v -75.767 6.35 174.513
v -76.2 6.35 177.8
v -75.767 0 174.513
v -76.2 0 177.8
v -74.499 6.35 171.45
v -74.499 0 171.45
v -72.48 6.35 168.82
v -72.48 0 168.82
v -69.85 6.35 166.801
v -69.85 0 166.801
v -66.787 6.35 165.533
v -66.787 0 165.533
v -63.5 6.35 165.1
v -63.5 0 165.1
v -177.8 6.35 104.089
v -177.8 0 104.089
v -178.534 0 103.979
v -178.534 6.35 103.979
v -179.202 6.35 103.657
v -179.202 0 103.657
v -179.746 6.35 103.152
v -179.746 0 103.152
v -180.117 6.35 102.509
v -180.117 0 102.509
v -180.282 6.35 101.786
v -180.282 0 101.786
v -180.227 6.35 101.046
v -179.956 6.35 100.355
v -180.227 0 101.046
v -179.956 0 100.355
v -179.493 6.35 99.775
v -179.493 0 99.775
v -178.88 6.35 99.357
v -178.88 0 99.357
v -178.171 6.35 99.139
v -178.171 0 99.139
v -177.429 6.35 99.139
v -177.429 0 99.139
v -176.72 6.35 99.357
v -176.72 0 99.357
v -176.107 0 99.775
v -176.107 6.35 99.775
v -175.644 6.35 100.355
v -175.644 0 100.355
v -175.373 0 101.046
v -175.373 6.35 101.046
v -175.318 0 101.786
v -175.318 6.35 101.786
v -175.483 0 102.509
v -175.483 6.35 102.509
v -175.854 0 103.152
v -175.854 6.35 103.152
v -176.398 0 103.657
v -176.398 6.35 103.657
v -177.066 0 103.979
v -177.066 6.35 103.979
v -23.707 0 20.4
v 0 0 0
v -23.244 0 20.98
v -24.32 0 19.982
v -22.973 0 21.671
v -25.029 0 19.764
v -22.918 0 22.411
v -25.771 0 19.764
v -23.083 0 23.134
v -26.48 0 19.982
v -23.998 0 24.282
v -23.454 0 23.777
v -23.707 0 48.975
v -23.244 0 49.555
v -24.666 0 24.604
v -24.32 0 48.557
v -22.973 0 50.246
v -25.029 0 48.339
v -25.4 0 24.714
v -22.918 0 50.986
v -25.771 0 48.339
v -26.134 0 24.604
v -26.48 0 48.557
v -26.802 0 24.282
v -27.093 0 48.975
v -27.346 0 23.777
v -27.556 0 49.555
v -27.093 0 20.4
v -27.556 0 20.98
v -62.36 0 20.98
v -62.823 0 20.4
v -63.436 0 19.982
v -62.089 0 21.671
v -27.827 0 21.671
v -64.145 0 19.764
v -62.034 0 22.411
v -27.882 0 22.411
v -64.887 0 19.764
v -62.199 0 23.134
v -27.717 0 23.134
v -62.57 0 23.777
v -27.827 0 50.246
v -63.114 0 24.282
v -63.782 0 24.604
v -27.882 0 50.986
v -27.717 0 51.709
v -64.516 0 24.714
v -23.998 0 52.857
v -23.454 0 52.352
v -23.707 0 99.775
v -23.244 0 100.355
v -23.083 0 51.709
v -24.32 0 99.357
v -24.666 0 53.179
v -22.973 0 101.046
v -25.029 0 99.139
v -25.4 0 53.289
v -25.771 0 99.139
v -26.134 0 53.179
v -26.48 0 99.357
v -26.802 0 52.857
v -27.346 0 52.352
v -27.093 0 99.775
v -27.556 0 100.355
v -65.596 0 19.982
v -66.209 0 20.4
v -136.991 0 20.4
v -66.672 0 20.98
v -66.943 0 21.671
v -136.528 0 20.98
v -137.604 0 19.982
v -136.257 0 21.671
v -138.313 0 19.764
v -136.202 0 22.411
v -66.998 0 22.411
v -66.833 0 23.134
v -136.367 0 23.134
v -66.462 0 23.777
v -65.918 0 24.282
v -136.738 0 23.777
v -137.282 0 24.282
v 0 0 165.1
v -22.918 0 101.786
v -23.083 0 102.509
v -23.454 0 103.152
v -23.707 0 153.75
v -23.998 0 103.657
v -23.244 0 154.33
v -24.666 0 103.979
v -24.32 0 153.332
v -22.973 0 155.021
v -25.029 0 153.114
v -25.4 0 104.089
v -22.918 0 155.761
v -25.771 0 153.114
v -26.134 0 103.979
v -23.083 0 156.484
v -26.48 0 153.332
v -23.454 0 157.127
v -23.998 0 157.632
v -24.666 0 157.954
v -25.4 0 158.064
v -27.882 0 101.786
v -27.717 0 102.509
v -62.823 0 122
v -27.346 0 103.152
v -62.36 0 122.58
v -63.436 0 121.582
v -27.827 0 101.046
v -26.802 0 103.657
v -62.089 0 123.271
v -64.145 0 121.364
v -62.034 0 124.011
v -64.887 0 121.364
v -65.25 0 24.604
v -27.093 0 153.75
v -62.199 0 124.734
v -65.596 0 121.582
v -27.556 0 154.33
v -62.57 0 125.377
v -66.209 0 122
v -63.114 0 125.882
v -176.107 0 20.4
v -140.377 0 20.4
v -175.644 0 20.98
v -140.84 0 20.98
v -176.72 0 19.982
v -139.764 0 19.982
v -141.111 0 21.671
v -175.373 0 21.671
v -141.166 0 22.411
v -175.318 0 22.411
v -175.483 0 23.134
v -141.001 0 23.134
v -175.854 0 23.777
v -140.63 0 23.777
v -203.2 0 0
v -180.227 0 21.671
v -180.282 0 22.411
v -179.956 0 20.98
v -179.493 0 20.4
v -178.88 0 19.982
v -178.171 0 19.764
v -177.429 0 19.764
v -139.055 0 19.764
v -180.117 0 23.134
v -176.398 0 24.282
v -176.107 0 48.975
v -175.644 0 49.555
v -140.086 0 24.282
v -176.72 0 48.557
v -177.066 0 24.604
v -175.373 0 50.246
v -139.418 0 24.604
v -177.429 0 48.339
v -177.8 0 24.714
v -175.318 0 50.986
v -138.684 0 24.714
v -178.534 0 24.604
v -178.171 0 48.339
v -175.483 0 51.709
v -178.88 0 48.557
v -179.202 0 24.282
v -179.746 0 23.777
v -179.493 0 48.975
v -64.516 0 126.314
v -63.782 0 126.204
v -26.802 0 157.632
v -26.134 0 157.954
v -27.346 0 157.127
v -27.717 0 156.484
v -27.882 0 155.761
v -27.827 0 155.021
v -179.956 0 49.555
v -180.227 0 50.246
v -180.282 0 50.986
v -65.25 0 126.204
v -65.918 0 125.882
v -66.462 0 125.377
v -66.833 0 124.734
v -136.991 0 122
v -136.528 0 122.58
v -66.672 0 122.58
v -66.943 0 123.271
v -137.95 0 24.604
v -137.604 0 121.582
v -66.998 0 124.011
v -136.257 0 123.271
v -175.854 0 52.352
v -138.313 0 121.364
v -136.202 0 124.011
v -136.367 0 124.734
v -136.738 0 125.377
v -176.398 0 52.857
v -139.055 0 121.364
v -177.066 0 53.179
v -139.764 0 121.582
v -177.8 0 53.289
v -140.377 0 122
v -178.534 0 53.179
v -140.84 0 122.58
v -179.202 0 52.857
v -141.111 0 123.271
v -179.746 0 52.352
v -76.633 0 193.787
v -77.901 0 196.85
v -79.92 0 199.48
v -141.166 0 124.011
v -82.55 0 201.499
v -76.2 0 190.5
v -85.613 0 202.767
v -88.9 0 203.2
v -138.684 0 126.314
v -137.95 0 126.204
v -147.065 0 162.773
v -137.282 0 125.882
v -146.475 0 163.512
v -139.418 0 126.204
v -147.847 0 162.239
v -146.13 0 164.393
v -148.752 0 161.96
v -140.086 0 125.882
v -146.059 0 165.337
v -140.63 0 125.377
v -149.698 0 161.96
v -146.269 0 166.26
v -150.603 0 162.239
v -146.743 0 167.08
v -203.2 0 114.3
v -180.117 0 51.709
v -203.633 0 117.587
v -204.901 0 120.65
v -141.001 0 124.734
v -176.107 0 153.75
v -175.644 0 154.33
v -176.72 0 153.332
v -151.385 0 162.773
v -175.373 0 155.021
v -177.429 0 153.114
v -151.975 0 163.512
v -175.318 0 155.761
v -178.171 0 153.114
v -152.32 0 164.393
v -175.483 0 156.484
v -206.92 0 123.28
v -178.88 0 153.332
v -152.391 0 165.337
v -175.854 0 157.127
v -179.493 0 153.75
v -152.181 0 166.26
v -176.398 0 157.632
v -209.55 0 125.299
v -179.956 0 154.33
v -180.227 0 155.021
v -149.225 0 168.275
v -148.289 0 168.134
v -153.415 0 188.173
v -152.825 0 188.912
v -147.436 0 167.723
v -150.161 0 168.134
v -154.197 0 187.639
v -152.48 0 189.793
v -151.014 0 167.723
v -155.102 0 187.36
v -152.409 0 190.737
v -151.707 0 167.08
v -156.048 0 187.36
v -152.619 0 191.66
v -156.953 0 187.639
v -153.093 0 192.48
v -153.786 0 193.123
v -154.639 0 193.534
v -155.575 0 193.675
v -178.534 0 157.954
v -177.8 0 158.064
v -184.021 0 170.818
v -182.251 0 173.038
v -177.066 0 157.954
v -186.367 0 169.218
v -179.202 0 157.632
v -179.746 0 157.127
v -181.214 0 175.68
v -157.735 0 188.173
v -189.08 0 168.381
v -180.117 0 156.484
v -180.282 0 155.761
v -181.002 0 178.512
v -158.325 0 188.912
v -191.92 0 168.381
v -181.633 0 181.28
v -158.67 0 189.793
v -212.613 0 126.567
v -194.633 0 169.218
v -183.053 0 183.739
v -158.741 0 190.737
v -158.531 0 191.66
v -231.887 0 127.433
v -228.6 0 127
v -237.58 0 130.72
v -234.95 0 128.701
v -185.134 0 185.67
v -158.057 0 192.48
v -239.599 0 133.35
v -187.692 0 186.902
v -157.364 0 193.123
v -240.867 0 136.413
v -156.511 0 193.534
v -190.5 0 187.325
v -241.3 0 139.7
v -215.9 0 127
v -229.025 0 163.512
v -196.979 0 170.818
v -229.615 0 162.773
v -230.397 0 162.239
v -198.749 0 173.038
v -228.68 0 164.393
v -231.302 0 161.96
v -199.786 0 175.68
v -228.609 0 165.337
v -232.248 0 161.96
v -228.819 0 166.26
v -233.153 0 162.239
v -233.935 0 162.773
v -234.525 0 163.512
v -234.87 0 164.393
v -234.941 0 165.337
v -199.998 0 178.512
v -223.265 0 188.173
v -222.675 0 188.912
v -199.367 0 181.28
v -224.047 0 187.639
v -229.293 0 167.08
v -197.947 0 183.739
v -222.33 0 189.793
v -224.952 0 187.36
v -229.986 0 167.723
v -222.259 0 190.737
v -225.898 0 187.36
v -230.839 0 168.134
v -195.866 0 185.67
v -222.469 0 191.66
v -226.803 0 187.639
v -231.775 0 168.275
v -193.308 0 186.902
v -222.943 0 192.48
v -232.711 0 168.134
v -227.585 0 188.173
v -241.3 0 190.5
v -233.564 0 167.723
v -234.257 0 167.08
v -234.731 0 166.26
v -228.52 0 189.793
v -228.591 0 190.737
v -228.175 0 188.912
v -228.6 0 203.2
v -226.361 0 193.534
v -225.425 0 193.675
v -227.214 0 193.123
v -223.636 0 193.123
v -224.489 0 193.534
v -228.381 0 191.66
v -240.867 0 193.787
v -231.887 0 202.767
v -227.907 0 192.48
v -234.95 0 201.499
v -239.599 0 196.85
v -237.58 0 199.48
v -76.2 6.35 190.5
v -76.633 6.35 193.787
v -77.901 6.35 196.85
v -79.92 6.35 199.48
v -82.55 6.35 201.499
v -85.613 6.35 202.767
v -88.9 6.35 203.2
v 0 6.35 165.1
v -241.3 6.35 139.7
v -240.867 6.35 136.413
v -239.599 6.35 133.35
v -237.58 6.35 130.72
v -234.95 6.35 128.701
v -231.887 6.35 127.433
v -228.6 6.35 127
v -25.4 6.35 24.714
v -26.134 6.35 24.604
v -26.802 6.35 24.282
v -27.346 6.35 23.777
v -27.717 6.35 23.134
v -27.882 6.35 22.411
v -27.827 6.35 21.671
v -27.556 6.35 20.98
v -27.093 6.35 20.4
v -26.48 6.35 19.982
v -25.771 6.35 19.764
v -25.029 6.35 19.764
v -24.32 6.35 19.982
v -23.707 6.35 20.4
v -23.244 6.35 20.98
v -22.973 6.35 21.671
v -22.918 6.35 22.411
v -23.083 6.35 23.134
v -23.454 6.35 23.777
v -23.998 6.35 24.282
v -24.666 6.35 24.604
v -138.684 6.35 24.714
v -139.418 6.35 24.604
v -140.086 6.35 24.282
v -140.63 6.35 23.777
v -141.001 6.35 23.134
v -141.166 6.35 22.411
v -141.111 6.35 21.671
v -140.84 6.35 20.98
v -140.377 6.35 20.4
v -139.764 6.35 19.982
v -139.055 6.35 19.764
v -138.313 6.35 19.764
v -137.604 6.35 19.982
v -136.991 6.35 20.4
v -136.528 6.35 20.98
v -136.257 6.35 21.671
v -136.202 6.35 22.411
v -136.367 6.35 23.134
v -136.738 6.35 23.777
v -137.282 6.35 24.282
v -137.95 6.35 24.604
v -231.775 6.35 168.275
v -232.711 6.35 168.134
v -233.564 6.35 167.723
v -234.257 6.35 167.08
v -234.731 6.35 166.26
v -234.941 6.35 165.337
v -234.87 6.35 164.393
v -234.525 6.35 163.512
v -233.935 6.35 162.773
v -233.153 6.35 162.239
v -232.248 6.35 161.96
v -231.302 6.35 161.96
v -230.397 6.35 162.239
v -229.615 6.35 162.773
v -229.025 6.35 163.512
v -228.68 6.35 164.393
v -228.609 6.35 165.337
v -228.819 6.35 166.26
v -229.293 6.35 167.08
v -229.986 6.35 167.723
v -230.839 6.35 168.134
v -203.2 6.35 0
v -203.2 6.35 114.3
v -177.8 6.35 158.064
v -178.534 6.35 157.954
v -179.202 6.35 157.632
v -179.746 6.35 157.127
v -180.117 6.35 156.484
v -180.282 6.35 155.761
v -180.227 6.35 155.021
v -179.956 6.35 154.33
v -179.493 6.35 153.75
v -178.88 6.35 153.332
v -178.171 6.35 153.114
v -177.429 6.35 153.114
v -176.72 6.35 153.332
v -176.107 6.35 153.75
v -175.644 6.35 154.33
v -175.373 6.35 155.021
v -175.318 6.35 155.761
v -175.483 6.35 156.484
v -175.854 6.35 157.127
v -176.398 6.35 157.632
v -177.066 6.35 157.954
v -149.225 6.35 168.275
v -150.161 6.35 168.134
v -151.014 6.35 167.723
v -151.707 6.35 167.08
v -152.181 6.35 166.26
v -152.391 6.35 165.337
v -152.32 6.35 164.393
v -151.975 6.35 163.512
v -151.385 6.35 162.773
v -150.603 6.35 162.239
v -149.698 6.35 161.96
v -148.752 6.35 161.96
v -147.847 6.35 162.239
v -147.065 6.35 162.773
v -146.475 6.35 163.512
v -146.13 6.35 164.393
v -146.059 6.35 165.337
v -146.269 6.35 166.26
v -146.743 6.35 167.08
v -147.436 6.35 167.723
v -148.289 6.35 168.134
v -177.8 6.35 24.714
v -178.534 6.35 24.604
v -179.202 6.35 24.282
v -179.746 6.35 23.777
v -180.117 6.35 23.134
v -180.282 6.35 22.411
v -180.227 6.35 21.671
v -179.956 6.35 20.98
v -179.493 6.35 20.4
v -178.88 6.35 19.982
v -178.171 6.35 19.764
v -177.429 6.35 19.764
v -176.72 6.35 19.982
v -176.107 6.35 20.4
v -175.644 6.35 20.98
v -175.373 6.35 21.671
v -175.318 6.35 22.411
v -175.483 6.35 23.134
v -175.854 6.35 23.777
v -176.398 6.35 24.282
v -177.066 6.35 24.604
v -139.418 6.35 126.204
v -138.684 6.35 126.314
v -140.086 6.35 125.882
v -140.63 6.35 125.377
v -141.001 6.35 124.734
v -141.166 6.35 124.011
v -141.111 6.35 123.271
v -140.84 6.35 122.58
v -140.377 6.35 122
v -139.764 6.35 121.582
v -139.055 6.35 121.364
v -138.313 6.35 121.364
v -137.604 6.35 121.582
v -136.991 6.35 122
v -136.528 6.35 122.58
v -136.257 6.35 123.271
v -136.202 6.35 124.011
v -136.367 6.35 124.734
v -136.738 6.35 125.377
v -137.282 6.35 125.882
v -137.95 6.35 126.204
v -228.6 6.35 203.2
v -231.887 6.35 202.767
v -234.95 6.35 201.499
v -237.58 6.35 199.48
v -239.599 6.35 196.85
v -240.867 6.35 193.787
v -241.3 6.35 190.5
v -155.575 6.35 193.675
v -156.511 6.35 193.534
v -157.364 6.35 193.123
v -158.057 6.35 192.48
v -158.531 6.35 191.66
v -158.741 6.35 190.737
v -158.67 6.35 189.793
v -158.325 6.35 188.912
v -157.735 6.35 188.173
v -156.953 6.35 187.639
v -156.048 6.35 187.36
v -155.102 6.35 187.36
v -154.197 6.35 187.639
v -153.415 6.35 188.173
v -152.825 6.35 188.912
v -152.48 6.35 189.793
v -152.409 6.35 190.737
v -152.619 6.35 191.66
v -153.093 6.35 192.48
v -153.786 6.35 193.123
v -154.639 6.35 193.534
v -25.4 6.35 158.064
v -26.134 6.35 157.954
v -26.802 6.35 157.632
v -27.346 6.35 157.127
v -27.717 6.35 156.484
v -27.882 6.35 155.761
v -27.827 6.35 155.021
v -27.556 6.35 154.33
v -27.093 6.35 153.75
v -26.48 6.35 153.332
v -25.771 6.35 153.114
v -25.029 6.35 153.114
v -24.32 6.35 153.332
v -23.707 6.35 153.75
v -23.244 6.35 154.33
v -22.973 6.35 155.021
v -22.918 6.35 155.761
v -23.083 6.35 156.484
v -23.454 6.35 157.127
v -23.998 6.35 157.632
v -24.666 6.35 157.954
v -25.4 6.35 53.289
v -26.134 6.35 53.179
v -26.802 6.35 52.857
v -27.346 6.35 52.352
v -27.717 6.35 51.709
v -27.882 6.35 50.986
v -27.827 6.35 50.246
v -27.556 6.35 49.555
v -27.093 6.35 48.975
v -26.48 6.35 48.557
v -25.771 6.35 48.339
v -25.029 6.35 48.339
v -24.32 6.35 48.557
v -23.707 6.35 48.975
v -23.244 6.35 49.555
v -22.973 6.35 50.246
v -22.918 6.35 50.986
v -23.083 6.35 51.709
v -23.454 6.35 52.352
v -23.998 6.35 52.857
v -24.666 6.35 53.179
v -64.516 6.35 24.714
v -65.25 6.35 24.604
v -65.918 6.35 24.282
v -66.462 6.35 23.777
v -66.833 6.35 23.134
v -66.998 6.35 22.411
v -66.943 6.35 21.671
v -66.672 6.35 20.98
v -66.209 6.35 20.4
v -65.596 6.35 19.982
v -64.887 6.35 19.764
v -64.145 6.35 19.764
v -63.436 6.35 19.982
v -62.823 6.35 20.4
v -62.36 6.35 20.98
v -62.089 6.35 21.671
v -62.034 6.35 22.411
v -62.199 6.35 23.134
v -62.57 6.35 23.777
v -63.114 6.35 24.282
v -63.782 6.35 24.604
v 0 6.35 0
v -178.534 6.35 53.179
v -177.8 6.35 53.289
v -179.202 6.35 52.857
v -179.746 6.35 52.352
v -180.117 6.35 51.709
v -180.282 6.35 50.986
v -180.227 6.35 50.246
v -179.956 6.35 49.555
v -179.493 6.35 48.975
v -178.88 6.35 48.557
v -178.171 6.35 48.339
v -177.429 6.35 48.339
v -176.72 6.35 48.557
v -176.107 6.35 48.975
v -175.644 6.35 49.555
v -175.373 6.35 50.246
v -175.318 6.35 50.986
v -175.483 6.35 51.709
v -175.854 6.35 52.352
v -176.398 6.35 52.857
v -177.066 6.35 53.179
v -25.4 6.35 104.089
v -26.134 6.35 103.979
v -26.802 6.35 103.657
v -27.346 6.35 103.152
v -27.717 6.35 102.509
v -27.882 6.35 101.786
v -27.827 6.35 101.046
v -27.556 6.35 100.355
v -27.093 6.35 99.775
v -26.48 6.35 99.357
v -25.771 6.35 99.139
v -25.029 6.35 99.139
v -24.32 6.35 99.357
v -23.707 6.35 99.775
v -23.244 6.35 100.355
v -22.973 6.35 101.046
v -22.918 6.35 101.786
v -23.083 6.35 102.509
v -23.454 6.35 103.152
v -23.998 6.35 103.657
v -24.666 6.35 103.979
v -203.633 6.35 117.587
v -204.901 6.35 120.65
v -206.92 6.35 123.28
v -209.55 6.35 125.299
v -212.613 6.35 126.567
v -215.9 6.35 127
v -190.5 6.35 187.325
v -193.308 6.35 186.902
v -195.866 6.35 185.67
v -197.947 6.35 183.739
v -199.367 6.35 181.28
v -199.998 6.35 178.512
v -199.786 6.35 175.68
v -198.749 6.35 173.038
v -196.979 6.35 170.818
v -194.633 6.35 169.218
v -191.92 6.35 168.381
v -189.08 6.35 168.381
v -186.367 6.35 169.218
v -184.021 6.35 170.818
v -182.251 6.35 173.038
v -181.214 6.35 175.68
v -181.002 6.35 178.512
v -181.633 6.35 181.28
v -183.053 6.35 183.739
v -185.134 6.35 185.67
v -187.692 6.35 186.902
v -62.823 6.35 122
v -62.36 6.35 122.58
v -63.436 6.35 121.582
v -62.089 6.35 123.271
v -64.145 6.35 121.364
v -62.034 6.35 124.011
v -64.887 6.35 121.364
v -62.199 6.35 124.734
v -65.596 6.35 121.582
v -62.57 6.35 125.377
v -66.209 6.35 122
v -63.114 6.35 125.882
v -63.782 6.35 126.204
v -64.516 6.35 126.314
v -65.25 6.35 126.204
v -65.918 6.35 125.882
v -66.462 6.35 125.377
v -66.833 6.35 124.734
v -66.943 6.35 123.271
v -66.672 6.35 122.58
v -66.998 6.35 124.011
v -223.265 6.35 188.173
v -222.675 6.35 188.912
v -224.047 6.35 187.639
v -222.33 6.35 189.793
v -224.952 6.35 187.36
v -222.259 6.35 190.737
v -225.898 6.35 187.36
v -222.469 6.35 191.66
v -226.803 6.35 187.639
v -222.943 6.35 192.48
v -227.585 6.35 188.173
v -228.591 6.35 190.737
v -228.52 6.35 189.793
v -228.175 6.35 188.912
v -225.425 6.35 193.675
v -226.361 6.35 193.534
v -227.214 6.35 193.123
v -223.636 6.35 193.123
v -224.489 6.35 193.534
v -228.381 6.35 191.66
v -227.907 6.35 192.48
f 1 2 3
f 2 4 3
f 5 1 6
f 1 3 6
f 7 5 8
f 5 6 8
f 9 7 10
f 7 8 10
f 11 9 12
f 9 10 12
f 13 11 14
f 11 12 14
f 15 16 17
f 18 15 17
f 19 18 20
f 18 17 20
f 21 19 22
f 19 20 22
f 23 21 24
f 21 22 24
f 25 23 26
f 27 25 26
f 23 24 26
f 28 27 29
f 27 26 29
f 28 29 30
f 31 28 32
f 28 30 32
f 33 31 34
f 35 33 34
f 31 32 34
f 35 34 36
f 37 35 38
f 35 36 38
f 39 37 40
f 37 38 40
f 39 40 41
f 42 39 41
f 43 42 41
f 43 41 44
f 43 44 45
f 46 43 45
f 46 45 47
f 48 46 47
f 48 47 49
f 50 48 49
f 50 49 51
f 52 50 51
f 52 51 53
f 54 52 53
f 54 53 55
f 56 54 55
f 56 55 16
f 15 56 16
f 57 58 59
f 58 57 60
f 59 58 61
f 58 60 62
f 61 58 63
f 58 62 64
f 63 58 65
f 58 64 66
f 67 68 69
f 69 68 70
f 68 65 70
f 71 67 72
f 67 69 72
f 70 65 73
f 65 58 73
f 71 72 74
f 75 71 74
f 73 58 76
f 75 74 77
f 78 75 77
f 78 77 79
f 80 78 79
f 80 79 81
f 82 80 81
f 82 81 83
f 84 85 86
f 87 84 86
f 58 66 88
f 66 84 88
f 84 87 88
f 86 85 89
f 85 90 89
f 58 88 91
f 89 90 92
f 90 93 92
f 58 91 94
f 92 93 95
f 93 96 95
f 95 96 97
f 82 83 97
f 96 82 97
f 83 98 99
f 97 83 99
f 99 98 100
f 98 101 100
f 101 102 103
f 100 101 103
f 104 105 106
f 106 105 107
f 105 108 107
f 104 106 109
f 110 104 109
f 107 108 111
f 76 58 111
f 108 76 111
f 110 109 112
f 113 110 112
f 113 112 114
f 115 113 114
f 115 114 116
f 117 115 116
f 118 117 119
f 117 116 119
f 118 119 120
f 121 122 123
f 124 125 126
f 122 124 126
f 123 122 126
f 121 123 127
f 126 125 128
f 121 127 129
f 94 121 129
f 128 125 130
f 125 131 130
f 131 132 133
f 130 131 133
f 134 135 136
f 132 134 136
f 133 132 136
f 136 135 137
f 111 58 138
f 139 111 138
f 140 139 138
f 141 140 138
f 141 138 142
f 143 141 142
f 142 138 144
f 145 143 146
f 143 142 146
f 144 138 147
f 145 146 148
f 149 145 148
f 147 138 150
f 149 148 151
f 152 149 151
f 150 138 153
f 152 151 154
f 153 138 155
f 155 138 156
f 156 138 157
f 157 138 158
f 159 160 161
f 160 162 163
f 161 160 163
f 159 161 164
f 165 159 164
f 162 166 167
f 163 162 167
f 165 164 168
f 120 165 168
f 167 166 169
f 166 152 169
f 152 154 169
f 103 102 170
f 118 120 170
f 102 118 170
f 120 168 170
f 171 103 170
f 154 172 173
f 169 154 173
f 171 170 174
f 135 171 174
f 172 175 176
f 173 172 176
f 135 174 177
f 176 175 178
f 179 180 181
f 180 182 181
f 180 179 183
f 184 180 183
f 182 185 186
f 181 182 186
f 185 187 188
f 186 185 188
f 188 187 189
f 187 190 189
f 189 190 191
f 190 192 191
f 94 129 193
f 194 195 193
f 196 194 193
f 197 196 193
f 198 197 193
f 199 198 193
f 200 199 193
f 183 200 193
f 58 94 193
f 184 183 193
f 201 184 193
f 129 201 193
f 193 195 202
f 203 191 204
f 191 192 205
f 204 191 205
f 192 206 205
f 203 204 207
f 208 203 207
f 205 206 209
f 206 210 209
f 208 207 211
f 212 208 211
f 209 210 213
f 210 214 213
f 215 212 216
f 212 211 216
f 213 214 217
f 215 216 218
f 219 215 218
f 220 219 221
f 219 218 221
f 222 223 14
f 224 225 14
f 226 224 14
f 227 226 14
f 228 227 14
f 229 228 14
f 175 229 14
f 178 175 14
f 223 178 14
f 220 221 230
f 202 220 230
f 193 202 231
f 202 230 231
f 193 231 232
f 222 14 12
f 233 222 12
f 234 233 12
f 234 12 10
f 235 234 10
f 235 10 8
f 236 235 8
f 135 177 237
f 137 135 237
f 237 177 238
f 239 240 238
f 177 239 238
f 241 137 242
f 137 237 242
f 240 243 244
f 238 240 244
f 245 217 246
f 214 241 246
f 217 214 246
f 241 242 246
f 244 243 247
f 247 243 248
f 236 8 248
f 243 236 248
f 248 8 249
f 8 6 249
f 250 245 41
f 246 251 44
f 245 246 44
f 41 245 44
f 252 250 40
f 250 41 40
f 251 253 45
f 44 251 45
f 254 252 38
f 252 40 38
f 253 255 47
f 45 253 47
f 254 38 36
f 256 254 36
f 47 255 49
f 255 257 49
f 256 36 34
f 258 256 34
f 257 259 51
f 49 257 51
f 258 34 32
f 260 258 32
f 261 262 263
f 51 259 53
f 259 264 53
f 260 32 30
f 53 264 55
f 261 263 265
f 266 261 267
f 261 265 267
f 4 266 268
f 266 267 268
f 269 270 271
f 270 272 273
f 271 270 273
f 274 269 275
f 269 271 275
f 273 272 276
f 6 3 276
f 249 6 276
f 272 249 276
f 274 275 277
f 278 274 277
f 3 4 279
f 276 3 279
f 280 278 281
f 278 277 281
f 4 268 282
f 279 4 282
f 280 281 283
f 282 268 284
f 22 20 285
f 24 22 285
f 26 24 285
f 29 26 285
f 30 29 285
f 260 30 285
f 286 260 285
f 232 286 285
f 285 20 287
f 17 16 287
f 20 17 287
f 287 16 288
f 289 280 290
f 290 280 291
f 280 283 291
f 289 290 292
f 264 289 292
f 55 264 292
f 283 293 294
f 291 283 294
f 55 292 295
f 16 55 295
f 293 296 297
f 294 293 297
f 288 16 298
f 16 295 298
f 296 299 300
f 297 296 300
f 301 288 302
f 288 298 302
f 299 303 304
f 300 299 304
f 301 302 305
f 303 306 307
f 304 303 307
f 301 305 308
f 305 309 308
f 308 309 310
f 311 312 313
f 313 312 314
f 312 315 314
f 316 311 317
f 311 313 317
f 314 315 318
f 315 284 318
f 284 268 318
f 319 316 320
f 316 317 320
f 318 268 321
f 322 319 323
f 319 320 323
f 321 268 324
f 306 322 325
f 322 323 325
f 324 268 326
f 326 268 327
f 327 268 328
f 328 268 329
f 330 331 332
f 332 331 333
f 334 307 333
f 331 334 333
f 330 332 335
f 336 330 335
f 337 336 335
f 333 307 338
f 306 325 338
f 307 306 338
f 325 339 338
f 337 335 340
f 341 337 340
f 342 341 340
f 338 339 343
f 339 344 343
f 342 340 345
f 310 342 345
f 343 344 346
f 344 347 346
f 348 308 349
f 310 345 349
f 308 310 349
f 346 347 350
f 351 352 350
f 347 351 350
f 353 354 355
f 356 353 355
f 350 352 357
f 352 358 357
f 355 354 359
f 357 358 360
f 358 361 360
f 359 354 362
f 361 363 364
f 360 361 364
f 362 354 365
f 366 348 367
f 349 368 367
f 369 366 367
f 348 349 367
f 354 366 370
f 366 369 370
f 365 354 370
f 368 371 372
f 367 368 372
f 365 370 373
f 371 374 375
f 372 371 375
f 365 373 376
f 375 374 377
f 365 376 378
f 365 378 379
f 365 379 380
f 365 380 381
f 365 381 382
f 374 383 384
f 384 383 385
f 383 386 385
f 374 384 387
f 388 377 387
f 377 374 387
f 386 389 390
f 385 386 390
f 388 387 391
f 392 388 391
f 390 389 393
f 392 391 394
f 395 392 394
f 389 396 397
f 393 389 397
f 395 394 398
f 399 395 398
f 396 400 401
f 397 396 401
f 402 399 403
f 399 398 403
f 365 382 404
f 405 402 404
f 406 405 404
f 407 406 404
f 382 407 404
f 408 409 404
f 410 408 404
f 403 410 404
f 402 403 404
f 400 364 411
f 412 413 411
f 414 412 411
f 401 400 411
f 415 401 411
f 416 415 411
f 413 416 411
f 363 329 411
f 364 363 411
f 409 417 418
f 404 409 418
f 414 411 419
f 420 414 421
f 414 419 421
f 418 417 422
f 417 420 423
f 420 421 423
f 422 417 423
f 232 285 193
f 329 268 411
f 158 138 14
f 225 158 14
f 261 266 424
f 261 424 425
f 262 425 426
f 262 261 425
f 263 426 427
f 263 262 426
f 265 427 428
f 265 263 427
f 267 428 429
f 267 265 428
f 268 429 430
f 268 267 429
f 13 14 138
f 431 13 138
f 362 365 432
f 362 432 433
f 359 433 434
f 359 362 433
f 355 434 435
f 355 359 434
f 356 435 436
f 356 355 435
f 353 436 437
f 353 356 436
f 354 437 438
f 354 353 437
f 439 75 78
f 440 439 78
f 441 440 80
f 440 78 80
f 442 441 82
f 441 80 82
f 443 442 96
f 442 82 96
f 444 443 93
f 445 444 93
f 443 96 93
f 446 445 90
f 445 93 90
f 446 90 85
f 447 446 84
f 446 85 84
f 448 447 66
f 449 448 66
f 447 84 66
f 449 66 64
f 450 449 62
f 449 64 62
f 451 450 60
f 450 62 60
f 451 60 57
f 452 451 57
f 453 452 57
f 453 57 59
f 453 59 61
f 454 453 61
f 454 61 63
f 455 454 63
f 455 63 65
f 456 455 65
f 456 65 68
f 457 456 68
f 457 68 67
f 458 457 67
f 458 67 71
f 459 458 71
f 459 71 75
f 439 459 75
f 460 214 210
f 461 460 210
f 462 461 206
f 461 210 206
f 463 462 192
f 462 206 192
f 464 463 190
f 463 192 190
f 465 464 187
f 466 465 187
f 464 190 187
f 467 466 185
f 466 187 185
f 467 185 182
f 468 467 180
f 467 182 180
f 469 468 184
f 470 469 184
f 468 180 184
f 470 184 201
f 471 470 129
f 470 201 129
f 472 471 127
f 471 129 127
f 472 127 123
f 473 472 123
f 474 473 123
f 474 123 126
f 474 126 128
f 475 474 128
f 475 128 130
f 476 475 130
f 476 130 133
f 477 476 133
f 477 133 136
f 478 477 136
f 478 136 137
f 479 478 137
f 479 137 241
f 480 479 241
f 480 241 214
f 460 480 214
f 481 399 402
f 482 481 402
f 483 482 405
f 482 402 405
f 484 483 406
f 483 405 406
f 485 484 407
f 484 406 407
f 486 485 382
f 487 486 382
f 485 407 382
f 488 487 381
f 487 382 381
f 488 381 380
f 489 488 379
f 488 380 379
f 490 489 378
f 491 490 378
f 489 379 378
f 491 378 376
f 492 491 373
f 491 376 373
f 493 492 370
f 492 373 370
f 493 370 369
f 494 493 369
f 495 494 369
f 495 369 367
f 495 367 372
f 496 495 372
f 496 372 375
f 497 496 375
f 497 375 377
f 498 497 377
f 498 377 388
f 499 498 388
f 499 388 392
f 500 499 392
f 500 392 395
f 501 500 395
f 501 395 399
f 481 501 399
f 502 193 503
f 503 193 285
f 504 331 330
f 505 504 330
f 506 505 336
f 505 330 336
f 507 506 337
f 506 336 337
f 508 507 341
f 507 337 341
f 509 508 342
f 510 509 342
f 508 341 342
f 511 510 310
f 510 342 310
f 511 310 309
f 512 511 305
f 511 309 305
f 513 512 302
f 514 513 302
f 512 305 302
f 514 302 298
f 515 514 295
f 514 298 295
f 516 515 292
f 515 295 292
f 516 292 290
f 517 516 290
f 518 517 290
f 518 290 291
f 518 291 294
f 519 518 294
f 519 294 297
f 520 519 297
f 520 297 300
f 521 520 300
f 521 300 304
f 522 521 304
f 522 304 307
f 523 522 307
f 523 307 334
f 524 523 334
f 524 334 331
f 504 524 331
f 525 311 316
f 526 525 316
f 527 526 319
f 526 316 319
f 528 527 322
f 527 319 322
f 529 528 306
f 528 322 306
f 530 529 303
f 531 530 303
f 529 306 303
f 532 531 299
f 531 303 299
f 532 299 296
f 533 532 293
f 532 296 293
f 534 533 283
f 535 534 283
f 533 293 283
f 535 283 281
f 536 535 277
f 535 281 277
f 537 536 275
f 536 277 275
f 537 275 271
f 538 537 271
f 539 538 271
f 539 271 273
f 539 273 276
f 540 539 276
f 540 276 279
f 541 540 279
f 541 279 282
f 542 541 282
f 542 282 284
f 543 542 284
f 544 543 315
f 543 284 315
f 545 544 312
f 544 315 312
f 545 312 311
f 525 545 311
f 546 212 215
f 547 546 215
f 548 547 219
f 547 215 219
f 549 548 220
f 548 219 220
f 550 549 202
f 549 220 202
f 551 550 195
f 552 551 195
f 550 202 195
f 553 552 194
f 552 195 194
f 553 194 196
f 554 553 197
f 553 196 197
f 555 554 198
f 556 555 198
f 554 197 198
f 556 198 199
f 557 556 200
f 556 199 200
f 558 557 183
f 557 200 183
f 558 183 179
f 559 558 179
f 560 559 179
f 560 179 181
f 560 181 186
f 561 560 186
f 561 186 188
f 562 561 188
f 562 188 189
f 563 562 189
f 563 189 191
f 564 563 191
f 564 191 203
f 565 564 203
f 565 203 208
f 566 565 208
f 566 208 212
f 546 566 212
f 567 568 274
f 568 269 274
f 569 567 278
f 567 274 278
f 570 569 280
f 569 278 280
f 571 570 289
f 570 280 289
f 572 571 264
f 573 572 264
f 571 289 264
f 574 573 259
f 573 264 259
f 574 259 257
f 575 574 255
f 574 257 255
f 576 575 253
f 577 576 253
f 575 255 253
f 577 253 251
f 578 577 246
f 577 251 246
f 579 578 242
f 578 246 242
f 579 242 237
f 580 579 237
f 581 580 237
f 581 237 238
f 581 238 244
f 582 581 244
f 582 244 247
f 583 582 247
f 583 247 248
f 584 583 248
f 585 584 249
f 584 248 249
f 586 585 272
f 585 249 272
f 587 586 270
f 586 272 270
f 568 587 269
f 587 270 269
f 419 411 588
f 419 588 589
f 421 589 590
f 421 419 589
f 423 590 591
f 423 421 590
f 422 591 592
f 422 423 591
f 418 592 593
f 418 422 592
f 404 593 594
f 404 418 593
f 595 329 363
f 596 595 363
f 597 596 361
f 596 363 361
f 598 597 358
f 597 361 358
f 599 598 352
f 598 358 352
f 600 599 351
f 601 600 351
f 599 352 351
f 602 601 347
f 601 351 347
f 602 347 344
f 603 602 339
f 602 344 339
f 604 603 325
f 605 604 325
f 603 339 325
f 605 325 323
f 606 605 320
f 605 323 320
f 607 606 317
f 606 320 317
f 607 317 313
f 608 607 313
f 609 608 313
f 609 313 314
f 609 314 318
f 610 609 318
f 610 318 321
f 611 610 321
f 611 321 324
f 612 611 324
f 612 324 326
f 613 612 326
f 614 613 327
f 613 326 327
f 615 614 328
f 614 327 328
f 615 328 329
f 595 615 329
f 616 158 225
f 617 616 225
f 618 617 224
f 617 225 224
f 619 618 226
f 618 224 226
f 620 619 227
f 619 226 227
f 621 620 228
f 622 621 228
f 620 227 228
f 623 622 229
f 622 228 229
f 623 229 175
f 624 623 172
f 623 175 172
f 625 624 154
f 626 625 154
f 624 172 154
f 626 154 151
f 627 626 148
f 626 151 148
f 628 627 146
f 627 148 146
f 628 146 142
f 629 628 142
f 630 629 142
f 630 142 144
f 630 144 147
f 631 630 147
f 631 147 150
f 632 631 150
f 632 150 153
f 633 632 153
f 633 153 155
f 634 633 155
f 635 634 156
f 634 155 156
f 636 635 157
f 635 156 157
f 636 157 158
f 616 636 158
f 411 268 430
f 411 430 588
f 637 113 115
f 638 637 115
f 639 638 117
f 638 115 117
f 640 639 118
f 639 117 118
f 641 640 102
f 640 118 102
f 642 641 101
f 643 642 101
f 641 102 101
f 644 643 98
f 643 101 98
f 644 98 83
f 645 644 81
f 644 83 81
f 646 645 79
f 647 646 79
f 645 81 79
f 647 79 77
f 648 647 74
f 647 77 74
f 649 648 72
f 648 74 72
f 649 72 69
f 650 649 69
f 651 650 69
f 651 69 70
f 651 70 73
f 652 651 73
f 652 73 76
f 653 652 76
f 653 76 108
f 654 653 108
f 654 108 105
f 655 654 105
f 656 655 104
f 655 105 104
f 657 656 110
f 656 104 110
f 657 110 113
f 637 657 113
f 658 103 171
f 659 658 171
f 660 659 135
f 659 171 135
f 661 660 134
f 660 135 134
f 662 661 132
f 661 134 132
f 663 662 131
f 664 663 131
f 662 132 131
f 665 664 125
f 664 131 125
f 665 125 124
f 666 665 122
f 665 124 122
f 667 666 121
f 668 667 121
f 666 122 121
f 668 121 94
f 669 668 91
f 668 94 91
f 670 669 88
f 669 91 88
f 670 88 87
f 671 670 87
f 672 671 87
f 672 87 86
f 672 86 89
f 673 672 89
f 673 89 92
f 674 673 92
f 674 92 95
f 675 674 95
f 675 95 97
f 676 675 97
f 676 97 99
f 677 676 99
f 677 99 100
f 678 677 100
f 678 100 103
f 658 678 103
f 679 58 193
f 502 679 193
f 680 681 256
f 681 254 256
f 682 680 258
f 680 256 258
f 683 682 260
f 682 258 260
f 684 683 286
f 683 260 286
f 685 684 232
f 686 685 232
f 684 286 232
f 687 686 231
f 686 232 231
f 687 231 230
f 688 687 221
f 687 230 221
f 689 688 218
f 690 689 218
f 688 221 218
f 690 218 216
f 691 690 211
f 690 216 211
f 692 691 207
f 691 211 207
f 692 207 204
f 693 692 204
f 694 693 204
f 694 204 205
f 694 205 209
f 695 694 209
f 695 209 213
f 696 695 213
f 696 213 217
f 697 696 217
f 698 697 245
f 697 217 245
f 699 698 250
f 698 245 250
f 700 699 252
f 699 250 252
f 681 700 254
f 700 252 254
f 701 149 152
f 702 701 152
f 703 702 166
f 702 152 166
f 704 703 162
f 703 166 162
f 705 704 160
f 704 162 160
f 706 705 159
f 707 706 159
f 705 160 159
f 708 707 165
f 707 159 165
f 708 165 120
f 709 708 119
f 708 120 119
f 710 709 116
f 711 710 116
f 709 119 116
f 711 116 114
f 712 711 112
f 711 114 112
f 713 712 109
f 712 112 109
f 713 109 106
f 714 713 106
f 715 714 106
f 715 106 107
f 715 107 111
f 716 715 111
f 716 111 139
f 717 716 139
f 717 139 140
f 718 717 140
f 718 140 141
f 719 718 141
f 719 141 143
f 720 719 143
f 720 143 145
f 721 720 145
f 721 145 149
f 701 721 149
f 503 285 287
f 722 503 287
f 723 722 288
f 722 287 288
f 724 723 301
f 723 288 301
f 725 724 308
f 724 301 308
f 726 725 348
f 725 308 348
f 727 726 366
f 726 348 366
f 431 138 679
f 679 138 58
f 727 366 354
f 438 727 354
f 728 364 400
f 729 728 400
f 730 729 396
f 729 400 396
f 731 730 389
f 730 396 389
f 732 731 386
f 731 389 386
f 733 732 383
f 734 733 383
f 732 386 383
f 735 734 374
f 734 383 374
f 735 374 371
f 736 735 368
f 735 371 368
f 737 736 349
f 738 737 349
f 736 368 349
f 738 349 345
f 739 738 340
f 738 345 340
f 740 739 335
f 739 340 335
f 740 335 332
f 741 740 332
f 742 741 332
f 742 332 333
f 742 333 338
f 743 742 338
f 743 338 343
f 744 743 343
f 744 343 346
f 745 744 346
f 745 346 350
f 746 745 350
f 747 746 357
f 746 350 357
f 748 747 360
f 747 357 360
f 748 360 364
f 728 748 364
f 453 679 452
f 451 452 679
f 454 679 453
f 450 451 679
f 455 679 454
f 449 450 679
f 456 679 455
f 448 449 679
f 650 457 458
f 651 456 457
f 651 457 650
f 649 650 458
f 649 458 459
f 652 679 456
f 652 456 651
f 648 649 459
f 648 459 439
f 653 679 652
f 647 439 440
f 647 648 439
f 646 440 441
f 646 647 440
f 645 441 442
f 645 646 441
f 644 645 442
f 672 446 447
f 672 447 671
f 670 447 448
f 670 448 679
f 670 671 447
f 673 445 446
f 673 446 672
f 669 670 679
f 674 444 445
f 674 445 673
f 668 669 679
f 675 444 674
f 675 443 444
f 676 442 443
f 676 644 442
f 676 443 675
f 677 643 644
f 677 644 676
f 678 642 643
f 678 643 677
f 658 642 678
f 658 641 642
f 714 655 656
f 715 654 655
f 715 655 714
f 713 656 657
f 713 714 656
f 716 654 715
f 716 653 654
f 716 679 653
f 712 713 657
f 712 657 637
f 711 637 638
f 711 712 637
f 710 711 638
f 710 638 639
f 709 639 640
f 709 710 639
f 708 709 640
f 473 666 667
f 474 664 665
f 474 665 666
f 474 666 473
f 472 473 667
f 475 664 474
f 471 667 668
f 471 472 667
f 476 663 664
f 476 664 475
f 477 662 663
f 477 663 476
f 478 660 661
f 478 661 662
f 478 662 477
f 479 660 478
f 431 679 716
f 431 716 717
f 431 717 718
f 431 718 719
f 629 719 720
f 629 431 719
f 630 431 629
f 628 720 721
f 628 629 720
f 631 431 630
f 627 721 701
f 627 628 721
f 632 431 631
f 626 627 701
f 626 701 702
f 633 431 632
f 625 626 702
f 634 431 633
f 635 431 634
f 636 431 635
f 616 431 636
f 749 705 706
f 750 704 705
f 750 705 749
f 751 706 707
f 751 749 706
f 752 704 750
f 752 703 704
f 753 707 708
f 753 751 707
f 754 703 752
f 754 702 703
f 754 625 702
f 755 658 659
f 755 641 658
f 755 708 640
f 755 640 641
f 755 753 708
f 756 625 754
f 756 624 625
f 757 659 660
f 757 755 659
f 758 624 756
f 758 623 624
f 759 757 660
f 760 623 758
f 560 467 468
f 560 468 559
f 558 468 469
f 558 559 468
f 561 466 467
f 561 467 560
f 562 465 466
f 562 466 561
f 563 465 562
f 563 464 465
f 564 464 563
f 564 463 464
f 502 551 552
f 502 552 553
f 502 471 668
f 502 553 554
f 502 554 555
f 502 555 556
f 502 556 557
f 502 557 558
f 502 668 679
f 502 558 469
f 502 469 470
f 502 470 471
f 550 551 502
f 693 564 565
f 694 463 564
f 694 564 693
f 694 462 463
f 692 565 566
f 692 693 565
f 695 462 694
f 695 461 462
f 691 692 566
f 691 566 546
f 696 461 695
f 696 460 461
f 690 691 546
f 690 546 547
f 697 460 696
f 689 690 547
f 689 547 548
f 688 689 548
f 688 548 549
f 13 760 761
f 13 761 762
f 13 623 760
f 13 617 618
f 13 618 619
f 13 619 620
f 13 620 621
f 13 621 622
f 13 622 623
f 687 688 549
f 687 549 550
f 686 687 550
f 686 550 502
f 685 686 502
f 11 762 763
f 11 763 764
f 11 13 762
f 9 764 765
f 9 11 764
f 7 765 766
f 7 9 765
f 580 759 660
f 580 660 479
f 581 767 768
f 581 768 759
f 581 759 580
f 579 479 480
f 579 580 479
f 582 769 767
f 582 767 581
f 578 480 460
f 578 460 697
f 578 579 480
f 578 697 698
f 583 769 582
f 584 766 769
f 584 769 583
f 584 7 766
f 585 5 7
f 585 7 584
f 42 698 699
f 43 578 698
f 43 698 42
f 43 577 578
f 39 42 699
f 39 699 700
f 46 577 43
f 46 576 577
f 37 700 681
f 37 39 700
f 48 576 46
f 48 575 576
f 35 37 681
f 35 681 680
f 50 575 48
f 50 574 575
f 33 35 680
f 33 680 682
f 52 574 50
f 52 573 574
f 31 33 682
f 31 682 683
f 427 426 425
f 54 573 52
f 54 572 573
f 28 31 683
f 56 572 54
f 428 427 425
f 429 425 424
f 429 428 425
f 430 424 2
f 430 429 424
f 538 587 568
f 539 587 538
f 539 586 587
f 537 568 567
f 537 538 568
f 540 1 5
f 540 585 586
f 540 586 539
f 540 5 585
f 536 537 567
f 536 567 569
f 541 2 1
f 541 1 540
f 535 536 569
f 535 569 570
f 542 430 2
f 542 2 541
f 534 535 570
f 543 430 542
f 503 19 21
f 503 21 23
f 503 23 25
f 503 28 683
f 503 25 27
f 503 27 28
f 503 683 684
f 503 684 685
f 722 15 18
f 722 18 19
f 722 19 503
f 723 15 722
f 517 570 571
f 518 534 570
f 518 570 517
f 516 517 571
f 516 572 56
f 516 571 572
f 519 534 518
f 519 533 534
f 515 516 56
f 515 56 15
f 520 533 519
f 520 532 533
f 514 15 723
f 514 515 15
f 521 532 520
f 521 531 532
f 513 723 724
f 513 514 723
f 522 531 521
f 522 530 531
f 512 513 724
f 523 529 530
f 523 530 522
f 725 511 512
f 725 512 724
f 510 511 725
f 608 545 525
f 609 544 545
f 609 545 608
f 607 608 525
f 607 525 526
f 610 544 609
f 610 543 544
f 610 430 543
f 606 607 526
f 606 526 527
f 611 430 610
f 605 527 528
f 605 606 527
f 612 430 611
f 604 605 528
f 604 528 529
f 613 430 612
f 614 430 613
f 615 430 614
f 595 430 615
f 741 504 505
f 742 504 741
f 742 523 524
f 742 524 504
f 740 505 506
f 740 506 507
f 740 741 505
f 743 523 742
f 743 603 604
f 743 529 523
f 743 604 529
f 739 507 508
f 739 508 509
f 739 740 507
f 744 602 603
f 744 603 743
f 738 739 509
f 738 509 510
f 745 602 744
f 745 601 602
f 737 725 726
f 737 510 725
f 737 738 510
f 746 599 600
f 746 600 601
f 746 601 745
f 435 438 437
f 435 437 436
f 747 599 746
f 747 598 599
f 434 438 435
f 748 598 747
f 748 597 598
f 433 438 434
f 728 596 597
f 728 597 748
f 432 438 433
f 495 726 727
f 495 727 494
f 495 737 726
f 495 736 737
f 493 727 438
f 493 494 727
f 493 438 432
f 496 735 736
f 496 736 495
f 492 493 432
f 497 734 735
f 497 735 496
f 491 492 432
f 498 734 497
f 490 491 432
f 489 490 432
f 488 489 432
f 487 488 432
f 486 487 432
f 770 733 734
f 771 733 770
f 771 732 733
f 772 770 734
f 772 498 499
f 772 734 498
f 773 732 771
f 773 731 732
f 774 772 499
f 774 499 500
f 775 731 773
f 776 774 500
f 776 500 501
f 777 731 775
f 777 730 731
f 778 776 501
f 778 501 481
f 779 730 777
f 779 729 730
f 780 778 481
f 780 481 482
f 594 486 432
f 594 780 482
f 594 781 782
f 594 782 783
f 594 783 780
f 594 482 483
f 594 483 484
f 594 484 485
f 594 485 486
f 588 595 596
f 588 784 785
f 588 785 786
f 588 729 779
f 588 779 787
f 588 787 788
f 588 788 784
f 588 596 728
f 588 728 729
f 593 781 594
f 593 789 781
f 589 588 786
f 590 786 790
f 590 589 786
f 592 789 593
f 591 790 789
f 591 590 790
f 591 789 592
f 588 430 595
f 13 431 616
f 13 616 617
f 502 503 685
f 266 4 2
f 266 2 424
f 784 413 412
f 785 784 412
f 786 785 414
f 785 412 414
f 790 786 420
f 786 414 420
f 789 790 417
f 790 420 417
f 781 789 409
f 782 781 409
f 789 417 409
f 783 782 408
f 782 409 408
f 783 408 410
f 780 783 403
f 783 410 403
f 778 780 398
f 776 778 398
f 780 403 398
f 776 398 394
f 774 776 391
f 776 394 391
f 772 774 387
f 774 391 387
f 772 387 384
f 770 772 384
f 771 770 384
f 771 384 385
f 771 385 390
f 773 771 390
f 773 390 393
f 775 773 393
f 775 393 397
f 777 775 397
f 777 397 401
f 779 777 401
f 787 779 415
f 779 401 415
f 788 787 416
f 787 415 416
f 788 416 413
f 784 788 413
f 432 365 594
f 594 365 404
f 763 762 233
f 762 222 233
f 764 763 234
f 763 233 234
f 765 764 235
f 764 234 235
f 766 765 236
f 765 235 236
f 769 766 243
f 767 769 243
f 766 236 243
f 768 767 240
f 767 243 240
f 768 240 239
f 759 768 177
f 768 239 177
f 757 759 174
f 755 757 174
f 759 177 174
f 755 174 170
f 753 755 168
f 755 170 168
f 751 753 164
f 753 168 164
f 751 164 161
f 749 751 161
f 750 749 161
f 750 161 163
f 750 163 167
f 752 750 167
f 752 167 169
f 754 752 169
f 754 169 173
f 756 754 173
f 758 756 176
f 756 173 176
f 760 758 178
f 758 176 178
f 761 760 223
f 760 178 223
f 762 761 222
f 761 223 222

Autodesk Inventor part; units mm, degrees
ref_plane "YZ Plane" through (0, 0, 0) normal (1, 0, 0) x (0, 1, 0)
ref_plane "XZ Plane" through (0, 0, 0) normal (0, 1, 0) x (-1, 0, 0)
ref_plane "XY Plane" through (0, 0, 0) normal (0, 0, 1) x (1, 0, 0)
sketch "Sketch1" plane through (0, 0, 0) normal (0, 1, 0) x (-1, 0, 0)
  line L0 (0, 0) -> (203.2, 0)
  line L1 (203.2, 0) -> (203.2, 114.3)
  line L2 (76.2, 165.1) -> (0, 165.1)
  line L3 (0, 165.1) -> (0, 0)
  line L4 (76.2, 165.1) -> (76.2, 190.5)
  line L5 (88.9, 203.2) -> (228.6, 203.2)
  arc A0 (63.5, 165.1) -> (76.2, 177.8) centre (63.5, 177.8) ccw
  arc A1 (241.3, 190.5) -> (228.6, 203.2) centre (228.6, 190.5) ccw
  arc A2 (88.9, 203.2) -> (76.2, 190.5) centre (88.9, 190.5) ccw
  line L6 (146.05, 0) -> (57.15, 0)
  line L7 (215.9, 127) -> (228.6, 127)
  line L8 (241.3, 139.7) -> (241.3, 190.5)
  arc A3 (215.9, 127) -> (203.2, 114.3) centre (215.9, 114.3) ccw
  arc A4 (228.6, 127) -> (241.3, 139.7) centre (228.6, 139.7) ccw
  point P0 (76.2, 203.2)
  point P1 (241.3, 127)
  dimension "d64" = 38.1
  dimension "d67" = 12.7
  dimension "d69" = 12.7
  dimension "d105" = 76.2
  dimension "d106" = 12.7
  dimension "d108" = 203.2
  dimension "d109" = 127
  dimension "d110" = 165.1
  dimension "d111" = 38.1
extrude "Plate2" add sketch "Sketch1" along normal blind 6.35
sketch "Sketch5" plane through (0, 6.35, 0) normal (0, 1, 0) x (1, 0, 0)
  line L0 (-203.2, -114.3) -> (-203.2, 0) projected
  line L1 (0, 0) -> (0, -165.1) projected
  line L2 (-203.2, 0) -> (0, 0) projected
  point P0 (-203.2, -165.1)
  point P1 (-177.8, -22.225)
  point P2 (-25.4, -22.225)
  point P3 (-25.4, -155.575)
  point P4 (-177.8, -155.575)
  point P5 (-177.8, -50.8)
  point P6 (-177.8, -101.6)
  point P7 (-25.4, -50.8)
  point P8 (-25.4, -101.6)
  point P9 (-203.2, -203.2)
  point P10 (-138.684, -22.225)
  point P11 (-64.516, -22.225)
  point P12 (-138.684, -123.825)
  point P13 (-64.516, -123.825)
  dimension "d27" = 25.4
  dimension "d28" = 25.4
  dimension "d30" = 133.35
  dimension "d62" = 22.225
  dimension "d89" = 50.8
  dimension "d90" = 50.8
  dimension "d91" = 25.4
  dimension "d93" = 152.4
  dimension "d94" = 25.4
  dimension "d147" = 64.516
  dimension "d148" = 64.516
  dimension "d149" = 101.6
hole "Hole2" at (-177.8, 6.35, 22.225) at (-25.4, 6.35, 22.225) at (-25.4, 6.35, 155.575) at (-177.8, 6.35, 155.575) at (-177.8, 6.35, 101.6) at (-177.8, 6.35, 50.8) at (-25.4, 6.35, 50.8) at (-25.4, 6.35, 101.6) at (-64.516, 6.35, 123.825) at (-138.684, 6.35, 123.825) at (-138.684, 6.35, 22.225) at (-64.516, 6.35, 22.225) direction (0, -1, 0) diameter 4.9784 end through all thread size "1/4-20 UNC" class "2B" standard "ANSI Unified Screw Threads"
sketch "Sketch12" plane through (0, 6.35, 0) normal (0, 1, 0) x (1, 0, 0)
  line L0 (-241.3, -190.5) -> (-241.3, -139.7) projected
  line L1 (-228.6, -127) -> (-215.9, -127) projected
  point P0 (-203.2, -203.2)
  point P1 (-190.5, -177.8)
  dimension "d107" = 50.8
  dimension "d129" = 50.8
hole "Hole3" at (-190.5, 6.35, 177.8) direction (0, -1, 0) diameter 19.05 end through all
sketch "Sketch14" plane through (0, 6.35, 0) normal (0, 1, 0) x (1, 0, 0)
  circle A0 centre (-190.5, -177.8) radius 9.525 projected
  point P0 (0, 0)
  point P1 (-225.425, -190.5)
  point P2 (-155.575, -190.5)
  point P3 (-149.225, -165.1)
  point P4 (-231.775, -165.1)
  dimension "d130" = 6.35
  dimension "d135" = 6.35
  dimension "d136" = 25.4
  dimension "d137" = 12.7
  dimension "d138" = 82.55
  dimension "d139" = 41.275
hole "Hole5" at (-225.425, 6.35, 190.5) at (-155.575, 6.35, 190.5) at (-149.225, 6.35, 165.1) at (-231.775, 6.35, 165.1) direction (0, -1, 0) diameter 6.35 end through all
equation "\"d91\" = d94"
equation "\"d148\" = d147"
equation "\"d102\" = Thickness"
equation "\"d135\" = d130"
equation "\"d139\" = 0.5 * d138"
equation "\"d145\" = Thickness"
equation "\"d106\" = d69"
equation "\"BendRadius\" = Thickness"
equation "\"BendReliefWidth\" = Thickness"
equation "\"BendReliefDepth\" = 0.5 * Thickness"
equation "\"CornerReliefSize\" = 4 * Thickness"
equation "\"MinimumRemnant\" = 2 * Thickness"
equation "\"TransitionRadius\" = BendRadius"
equation "\"JacobiRadiusSize\" = Thickness"
equation "\"GapSize\" = Thickness"
equation "\"d15\" = BendRadius"
equation "\"d16\" = BendRadius"
equation "\"Thickness\" = 6.35"
properties part number "backplate"
